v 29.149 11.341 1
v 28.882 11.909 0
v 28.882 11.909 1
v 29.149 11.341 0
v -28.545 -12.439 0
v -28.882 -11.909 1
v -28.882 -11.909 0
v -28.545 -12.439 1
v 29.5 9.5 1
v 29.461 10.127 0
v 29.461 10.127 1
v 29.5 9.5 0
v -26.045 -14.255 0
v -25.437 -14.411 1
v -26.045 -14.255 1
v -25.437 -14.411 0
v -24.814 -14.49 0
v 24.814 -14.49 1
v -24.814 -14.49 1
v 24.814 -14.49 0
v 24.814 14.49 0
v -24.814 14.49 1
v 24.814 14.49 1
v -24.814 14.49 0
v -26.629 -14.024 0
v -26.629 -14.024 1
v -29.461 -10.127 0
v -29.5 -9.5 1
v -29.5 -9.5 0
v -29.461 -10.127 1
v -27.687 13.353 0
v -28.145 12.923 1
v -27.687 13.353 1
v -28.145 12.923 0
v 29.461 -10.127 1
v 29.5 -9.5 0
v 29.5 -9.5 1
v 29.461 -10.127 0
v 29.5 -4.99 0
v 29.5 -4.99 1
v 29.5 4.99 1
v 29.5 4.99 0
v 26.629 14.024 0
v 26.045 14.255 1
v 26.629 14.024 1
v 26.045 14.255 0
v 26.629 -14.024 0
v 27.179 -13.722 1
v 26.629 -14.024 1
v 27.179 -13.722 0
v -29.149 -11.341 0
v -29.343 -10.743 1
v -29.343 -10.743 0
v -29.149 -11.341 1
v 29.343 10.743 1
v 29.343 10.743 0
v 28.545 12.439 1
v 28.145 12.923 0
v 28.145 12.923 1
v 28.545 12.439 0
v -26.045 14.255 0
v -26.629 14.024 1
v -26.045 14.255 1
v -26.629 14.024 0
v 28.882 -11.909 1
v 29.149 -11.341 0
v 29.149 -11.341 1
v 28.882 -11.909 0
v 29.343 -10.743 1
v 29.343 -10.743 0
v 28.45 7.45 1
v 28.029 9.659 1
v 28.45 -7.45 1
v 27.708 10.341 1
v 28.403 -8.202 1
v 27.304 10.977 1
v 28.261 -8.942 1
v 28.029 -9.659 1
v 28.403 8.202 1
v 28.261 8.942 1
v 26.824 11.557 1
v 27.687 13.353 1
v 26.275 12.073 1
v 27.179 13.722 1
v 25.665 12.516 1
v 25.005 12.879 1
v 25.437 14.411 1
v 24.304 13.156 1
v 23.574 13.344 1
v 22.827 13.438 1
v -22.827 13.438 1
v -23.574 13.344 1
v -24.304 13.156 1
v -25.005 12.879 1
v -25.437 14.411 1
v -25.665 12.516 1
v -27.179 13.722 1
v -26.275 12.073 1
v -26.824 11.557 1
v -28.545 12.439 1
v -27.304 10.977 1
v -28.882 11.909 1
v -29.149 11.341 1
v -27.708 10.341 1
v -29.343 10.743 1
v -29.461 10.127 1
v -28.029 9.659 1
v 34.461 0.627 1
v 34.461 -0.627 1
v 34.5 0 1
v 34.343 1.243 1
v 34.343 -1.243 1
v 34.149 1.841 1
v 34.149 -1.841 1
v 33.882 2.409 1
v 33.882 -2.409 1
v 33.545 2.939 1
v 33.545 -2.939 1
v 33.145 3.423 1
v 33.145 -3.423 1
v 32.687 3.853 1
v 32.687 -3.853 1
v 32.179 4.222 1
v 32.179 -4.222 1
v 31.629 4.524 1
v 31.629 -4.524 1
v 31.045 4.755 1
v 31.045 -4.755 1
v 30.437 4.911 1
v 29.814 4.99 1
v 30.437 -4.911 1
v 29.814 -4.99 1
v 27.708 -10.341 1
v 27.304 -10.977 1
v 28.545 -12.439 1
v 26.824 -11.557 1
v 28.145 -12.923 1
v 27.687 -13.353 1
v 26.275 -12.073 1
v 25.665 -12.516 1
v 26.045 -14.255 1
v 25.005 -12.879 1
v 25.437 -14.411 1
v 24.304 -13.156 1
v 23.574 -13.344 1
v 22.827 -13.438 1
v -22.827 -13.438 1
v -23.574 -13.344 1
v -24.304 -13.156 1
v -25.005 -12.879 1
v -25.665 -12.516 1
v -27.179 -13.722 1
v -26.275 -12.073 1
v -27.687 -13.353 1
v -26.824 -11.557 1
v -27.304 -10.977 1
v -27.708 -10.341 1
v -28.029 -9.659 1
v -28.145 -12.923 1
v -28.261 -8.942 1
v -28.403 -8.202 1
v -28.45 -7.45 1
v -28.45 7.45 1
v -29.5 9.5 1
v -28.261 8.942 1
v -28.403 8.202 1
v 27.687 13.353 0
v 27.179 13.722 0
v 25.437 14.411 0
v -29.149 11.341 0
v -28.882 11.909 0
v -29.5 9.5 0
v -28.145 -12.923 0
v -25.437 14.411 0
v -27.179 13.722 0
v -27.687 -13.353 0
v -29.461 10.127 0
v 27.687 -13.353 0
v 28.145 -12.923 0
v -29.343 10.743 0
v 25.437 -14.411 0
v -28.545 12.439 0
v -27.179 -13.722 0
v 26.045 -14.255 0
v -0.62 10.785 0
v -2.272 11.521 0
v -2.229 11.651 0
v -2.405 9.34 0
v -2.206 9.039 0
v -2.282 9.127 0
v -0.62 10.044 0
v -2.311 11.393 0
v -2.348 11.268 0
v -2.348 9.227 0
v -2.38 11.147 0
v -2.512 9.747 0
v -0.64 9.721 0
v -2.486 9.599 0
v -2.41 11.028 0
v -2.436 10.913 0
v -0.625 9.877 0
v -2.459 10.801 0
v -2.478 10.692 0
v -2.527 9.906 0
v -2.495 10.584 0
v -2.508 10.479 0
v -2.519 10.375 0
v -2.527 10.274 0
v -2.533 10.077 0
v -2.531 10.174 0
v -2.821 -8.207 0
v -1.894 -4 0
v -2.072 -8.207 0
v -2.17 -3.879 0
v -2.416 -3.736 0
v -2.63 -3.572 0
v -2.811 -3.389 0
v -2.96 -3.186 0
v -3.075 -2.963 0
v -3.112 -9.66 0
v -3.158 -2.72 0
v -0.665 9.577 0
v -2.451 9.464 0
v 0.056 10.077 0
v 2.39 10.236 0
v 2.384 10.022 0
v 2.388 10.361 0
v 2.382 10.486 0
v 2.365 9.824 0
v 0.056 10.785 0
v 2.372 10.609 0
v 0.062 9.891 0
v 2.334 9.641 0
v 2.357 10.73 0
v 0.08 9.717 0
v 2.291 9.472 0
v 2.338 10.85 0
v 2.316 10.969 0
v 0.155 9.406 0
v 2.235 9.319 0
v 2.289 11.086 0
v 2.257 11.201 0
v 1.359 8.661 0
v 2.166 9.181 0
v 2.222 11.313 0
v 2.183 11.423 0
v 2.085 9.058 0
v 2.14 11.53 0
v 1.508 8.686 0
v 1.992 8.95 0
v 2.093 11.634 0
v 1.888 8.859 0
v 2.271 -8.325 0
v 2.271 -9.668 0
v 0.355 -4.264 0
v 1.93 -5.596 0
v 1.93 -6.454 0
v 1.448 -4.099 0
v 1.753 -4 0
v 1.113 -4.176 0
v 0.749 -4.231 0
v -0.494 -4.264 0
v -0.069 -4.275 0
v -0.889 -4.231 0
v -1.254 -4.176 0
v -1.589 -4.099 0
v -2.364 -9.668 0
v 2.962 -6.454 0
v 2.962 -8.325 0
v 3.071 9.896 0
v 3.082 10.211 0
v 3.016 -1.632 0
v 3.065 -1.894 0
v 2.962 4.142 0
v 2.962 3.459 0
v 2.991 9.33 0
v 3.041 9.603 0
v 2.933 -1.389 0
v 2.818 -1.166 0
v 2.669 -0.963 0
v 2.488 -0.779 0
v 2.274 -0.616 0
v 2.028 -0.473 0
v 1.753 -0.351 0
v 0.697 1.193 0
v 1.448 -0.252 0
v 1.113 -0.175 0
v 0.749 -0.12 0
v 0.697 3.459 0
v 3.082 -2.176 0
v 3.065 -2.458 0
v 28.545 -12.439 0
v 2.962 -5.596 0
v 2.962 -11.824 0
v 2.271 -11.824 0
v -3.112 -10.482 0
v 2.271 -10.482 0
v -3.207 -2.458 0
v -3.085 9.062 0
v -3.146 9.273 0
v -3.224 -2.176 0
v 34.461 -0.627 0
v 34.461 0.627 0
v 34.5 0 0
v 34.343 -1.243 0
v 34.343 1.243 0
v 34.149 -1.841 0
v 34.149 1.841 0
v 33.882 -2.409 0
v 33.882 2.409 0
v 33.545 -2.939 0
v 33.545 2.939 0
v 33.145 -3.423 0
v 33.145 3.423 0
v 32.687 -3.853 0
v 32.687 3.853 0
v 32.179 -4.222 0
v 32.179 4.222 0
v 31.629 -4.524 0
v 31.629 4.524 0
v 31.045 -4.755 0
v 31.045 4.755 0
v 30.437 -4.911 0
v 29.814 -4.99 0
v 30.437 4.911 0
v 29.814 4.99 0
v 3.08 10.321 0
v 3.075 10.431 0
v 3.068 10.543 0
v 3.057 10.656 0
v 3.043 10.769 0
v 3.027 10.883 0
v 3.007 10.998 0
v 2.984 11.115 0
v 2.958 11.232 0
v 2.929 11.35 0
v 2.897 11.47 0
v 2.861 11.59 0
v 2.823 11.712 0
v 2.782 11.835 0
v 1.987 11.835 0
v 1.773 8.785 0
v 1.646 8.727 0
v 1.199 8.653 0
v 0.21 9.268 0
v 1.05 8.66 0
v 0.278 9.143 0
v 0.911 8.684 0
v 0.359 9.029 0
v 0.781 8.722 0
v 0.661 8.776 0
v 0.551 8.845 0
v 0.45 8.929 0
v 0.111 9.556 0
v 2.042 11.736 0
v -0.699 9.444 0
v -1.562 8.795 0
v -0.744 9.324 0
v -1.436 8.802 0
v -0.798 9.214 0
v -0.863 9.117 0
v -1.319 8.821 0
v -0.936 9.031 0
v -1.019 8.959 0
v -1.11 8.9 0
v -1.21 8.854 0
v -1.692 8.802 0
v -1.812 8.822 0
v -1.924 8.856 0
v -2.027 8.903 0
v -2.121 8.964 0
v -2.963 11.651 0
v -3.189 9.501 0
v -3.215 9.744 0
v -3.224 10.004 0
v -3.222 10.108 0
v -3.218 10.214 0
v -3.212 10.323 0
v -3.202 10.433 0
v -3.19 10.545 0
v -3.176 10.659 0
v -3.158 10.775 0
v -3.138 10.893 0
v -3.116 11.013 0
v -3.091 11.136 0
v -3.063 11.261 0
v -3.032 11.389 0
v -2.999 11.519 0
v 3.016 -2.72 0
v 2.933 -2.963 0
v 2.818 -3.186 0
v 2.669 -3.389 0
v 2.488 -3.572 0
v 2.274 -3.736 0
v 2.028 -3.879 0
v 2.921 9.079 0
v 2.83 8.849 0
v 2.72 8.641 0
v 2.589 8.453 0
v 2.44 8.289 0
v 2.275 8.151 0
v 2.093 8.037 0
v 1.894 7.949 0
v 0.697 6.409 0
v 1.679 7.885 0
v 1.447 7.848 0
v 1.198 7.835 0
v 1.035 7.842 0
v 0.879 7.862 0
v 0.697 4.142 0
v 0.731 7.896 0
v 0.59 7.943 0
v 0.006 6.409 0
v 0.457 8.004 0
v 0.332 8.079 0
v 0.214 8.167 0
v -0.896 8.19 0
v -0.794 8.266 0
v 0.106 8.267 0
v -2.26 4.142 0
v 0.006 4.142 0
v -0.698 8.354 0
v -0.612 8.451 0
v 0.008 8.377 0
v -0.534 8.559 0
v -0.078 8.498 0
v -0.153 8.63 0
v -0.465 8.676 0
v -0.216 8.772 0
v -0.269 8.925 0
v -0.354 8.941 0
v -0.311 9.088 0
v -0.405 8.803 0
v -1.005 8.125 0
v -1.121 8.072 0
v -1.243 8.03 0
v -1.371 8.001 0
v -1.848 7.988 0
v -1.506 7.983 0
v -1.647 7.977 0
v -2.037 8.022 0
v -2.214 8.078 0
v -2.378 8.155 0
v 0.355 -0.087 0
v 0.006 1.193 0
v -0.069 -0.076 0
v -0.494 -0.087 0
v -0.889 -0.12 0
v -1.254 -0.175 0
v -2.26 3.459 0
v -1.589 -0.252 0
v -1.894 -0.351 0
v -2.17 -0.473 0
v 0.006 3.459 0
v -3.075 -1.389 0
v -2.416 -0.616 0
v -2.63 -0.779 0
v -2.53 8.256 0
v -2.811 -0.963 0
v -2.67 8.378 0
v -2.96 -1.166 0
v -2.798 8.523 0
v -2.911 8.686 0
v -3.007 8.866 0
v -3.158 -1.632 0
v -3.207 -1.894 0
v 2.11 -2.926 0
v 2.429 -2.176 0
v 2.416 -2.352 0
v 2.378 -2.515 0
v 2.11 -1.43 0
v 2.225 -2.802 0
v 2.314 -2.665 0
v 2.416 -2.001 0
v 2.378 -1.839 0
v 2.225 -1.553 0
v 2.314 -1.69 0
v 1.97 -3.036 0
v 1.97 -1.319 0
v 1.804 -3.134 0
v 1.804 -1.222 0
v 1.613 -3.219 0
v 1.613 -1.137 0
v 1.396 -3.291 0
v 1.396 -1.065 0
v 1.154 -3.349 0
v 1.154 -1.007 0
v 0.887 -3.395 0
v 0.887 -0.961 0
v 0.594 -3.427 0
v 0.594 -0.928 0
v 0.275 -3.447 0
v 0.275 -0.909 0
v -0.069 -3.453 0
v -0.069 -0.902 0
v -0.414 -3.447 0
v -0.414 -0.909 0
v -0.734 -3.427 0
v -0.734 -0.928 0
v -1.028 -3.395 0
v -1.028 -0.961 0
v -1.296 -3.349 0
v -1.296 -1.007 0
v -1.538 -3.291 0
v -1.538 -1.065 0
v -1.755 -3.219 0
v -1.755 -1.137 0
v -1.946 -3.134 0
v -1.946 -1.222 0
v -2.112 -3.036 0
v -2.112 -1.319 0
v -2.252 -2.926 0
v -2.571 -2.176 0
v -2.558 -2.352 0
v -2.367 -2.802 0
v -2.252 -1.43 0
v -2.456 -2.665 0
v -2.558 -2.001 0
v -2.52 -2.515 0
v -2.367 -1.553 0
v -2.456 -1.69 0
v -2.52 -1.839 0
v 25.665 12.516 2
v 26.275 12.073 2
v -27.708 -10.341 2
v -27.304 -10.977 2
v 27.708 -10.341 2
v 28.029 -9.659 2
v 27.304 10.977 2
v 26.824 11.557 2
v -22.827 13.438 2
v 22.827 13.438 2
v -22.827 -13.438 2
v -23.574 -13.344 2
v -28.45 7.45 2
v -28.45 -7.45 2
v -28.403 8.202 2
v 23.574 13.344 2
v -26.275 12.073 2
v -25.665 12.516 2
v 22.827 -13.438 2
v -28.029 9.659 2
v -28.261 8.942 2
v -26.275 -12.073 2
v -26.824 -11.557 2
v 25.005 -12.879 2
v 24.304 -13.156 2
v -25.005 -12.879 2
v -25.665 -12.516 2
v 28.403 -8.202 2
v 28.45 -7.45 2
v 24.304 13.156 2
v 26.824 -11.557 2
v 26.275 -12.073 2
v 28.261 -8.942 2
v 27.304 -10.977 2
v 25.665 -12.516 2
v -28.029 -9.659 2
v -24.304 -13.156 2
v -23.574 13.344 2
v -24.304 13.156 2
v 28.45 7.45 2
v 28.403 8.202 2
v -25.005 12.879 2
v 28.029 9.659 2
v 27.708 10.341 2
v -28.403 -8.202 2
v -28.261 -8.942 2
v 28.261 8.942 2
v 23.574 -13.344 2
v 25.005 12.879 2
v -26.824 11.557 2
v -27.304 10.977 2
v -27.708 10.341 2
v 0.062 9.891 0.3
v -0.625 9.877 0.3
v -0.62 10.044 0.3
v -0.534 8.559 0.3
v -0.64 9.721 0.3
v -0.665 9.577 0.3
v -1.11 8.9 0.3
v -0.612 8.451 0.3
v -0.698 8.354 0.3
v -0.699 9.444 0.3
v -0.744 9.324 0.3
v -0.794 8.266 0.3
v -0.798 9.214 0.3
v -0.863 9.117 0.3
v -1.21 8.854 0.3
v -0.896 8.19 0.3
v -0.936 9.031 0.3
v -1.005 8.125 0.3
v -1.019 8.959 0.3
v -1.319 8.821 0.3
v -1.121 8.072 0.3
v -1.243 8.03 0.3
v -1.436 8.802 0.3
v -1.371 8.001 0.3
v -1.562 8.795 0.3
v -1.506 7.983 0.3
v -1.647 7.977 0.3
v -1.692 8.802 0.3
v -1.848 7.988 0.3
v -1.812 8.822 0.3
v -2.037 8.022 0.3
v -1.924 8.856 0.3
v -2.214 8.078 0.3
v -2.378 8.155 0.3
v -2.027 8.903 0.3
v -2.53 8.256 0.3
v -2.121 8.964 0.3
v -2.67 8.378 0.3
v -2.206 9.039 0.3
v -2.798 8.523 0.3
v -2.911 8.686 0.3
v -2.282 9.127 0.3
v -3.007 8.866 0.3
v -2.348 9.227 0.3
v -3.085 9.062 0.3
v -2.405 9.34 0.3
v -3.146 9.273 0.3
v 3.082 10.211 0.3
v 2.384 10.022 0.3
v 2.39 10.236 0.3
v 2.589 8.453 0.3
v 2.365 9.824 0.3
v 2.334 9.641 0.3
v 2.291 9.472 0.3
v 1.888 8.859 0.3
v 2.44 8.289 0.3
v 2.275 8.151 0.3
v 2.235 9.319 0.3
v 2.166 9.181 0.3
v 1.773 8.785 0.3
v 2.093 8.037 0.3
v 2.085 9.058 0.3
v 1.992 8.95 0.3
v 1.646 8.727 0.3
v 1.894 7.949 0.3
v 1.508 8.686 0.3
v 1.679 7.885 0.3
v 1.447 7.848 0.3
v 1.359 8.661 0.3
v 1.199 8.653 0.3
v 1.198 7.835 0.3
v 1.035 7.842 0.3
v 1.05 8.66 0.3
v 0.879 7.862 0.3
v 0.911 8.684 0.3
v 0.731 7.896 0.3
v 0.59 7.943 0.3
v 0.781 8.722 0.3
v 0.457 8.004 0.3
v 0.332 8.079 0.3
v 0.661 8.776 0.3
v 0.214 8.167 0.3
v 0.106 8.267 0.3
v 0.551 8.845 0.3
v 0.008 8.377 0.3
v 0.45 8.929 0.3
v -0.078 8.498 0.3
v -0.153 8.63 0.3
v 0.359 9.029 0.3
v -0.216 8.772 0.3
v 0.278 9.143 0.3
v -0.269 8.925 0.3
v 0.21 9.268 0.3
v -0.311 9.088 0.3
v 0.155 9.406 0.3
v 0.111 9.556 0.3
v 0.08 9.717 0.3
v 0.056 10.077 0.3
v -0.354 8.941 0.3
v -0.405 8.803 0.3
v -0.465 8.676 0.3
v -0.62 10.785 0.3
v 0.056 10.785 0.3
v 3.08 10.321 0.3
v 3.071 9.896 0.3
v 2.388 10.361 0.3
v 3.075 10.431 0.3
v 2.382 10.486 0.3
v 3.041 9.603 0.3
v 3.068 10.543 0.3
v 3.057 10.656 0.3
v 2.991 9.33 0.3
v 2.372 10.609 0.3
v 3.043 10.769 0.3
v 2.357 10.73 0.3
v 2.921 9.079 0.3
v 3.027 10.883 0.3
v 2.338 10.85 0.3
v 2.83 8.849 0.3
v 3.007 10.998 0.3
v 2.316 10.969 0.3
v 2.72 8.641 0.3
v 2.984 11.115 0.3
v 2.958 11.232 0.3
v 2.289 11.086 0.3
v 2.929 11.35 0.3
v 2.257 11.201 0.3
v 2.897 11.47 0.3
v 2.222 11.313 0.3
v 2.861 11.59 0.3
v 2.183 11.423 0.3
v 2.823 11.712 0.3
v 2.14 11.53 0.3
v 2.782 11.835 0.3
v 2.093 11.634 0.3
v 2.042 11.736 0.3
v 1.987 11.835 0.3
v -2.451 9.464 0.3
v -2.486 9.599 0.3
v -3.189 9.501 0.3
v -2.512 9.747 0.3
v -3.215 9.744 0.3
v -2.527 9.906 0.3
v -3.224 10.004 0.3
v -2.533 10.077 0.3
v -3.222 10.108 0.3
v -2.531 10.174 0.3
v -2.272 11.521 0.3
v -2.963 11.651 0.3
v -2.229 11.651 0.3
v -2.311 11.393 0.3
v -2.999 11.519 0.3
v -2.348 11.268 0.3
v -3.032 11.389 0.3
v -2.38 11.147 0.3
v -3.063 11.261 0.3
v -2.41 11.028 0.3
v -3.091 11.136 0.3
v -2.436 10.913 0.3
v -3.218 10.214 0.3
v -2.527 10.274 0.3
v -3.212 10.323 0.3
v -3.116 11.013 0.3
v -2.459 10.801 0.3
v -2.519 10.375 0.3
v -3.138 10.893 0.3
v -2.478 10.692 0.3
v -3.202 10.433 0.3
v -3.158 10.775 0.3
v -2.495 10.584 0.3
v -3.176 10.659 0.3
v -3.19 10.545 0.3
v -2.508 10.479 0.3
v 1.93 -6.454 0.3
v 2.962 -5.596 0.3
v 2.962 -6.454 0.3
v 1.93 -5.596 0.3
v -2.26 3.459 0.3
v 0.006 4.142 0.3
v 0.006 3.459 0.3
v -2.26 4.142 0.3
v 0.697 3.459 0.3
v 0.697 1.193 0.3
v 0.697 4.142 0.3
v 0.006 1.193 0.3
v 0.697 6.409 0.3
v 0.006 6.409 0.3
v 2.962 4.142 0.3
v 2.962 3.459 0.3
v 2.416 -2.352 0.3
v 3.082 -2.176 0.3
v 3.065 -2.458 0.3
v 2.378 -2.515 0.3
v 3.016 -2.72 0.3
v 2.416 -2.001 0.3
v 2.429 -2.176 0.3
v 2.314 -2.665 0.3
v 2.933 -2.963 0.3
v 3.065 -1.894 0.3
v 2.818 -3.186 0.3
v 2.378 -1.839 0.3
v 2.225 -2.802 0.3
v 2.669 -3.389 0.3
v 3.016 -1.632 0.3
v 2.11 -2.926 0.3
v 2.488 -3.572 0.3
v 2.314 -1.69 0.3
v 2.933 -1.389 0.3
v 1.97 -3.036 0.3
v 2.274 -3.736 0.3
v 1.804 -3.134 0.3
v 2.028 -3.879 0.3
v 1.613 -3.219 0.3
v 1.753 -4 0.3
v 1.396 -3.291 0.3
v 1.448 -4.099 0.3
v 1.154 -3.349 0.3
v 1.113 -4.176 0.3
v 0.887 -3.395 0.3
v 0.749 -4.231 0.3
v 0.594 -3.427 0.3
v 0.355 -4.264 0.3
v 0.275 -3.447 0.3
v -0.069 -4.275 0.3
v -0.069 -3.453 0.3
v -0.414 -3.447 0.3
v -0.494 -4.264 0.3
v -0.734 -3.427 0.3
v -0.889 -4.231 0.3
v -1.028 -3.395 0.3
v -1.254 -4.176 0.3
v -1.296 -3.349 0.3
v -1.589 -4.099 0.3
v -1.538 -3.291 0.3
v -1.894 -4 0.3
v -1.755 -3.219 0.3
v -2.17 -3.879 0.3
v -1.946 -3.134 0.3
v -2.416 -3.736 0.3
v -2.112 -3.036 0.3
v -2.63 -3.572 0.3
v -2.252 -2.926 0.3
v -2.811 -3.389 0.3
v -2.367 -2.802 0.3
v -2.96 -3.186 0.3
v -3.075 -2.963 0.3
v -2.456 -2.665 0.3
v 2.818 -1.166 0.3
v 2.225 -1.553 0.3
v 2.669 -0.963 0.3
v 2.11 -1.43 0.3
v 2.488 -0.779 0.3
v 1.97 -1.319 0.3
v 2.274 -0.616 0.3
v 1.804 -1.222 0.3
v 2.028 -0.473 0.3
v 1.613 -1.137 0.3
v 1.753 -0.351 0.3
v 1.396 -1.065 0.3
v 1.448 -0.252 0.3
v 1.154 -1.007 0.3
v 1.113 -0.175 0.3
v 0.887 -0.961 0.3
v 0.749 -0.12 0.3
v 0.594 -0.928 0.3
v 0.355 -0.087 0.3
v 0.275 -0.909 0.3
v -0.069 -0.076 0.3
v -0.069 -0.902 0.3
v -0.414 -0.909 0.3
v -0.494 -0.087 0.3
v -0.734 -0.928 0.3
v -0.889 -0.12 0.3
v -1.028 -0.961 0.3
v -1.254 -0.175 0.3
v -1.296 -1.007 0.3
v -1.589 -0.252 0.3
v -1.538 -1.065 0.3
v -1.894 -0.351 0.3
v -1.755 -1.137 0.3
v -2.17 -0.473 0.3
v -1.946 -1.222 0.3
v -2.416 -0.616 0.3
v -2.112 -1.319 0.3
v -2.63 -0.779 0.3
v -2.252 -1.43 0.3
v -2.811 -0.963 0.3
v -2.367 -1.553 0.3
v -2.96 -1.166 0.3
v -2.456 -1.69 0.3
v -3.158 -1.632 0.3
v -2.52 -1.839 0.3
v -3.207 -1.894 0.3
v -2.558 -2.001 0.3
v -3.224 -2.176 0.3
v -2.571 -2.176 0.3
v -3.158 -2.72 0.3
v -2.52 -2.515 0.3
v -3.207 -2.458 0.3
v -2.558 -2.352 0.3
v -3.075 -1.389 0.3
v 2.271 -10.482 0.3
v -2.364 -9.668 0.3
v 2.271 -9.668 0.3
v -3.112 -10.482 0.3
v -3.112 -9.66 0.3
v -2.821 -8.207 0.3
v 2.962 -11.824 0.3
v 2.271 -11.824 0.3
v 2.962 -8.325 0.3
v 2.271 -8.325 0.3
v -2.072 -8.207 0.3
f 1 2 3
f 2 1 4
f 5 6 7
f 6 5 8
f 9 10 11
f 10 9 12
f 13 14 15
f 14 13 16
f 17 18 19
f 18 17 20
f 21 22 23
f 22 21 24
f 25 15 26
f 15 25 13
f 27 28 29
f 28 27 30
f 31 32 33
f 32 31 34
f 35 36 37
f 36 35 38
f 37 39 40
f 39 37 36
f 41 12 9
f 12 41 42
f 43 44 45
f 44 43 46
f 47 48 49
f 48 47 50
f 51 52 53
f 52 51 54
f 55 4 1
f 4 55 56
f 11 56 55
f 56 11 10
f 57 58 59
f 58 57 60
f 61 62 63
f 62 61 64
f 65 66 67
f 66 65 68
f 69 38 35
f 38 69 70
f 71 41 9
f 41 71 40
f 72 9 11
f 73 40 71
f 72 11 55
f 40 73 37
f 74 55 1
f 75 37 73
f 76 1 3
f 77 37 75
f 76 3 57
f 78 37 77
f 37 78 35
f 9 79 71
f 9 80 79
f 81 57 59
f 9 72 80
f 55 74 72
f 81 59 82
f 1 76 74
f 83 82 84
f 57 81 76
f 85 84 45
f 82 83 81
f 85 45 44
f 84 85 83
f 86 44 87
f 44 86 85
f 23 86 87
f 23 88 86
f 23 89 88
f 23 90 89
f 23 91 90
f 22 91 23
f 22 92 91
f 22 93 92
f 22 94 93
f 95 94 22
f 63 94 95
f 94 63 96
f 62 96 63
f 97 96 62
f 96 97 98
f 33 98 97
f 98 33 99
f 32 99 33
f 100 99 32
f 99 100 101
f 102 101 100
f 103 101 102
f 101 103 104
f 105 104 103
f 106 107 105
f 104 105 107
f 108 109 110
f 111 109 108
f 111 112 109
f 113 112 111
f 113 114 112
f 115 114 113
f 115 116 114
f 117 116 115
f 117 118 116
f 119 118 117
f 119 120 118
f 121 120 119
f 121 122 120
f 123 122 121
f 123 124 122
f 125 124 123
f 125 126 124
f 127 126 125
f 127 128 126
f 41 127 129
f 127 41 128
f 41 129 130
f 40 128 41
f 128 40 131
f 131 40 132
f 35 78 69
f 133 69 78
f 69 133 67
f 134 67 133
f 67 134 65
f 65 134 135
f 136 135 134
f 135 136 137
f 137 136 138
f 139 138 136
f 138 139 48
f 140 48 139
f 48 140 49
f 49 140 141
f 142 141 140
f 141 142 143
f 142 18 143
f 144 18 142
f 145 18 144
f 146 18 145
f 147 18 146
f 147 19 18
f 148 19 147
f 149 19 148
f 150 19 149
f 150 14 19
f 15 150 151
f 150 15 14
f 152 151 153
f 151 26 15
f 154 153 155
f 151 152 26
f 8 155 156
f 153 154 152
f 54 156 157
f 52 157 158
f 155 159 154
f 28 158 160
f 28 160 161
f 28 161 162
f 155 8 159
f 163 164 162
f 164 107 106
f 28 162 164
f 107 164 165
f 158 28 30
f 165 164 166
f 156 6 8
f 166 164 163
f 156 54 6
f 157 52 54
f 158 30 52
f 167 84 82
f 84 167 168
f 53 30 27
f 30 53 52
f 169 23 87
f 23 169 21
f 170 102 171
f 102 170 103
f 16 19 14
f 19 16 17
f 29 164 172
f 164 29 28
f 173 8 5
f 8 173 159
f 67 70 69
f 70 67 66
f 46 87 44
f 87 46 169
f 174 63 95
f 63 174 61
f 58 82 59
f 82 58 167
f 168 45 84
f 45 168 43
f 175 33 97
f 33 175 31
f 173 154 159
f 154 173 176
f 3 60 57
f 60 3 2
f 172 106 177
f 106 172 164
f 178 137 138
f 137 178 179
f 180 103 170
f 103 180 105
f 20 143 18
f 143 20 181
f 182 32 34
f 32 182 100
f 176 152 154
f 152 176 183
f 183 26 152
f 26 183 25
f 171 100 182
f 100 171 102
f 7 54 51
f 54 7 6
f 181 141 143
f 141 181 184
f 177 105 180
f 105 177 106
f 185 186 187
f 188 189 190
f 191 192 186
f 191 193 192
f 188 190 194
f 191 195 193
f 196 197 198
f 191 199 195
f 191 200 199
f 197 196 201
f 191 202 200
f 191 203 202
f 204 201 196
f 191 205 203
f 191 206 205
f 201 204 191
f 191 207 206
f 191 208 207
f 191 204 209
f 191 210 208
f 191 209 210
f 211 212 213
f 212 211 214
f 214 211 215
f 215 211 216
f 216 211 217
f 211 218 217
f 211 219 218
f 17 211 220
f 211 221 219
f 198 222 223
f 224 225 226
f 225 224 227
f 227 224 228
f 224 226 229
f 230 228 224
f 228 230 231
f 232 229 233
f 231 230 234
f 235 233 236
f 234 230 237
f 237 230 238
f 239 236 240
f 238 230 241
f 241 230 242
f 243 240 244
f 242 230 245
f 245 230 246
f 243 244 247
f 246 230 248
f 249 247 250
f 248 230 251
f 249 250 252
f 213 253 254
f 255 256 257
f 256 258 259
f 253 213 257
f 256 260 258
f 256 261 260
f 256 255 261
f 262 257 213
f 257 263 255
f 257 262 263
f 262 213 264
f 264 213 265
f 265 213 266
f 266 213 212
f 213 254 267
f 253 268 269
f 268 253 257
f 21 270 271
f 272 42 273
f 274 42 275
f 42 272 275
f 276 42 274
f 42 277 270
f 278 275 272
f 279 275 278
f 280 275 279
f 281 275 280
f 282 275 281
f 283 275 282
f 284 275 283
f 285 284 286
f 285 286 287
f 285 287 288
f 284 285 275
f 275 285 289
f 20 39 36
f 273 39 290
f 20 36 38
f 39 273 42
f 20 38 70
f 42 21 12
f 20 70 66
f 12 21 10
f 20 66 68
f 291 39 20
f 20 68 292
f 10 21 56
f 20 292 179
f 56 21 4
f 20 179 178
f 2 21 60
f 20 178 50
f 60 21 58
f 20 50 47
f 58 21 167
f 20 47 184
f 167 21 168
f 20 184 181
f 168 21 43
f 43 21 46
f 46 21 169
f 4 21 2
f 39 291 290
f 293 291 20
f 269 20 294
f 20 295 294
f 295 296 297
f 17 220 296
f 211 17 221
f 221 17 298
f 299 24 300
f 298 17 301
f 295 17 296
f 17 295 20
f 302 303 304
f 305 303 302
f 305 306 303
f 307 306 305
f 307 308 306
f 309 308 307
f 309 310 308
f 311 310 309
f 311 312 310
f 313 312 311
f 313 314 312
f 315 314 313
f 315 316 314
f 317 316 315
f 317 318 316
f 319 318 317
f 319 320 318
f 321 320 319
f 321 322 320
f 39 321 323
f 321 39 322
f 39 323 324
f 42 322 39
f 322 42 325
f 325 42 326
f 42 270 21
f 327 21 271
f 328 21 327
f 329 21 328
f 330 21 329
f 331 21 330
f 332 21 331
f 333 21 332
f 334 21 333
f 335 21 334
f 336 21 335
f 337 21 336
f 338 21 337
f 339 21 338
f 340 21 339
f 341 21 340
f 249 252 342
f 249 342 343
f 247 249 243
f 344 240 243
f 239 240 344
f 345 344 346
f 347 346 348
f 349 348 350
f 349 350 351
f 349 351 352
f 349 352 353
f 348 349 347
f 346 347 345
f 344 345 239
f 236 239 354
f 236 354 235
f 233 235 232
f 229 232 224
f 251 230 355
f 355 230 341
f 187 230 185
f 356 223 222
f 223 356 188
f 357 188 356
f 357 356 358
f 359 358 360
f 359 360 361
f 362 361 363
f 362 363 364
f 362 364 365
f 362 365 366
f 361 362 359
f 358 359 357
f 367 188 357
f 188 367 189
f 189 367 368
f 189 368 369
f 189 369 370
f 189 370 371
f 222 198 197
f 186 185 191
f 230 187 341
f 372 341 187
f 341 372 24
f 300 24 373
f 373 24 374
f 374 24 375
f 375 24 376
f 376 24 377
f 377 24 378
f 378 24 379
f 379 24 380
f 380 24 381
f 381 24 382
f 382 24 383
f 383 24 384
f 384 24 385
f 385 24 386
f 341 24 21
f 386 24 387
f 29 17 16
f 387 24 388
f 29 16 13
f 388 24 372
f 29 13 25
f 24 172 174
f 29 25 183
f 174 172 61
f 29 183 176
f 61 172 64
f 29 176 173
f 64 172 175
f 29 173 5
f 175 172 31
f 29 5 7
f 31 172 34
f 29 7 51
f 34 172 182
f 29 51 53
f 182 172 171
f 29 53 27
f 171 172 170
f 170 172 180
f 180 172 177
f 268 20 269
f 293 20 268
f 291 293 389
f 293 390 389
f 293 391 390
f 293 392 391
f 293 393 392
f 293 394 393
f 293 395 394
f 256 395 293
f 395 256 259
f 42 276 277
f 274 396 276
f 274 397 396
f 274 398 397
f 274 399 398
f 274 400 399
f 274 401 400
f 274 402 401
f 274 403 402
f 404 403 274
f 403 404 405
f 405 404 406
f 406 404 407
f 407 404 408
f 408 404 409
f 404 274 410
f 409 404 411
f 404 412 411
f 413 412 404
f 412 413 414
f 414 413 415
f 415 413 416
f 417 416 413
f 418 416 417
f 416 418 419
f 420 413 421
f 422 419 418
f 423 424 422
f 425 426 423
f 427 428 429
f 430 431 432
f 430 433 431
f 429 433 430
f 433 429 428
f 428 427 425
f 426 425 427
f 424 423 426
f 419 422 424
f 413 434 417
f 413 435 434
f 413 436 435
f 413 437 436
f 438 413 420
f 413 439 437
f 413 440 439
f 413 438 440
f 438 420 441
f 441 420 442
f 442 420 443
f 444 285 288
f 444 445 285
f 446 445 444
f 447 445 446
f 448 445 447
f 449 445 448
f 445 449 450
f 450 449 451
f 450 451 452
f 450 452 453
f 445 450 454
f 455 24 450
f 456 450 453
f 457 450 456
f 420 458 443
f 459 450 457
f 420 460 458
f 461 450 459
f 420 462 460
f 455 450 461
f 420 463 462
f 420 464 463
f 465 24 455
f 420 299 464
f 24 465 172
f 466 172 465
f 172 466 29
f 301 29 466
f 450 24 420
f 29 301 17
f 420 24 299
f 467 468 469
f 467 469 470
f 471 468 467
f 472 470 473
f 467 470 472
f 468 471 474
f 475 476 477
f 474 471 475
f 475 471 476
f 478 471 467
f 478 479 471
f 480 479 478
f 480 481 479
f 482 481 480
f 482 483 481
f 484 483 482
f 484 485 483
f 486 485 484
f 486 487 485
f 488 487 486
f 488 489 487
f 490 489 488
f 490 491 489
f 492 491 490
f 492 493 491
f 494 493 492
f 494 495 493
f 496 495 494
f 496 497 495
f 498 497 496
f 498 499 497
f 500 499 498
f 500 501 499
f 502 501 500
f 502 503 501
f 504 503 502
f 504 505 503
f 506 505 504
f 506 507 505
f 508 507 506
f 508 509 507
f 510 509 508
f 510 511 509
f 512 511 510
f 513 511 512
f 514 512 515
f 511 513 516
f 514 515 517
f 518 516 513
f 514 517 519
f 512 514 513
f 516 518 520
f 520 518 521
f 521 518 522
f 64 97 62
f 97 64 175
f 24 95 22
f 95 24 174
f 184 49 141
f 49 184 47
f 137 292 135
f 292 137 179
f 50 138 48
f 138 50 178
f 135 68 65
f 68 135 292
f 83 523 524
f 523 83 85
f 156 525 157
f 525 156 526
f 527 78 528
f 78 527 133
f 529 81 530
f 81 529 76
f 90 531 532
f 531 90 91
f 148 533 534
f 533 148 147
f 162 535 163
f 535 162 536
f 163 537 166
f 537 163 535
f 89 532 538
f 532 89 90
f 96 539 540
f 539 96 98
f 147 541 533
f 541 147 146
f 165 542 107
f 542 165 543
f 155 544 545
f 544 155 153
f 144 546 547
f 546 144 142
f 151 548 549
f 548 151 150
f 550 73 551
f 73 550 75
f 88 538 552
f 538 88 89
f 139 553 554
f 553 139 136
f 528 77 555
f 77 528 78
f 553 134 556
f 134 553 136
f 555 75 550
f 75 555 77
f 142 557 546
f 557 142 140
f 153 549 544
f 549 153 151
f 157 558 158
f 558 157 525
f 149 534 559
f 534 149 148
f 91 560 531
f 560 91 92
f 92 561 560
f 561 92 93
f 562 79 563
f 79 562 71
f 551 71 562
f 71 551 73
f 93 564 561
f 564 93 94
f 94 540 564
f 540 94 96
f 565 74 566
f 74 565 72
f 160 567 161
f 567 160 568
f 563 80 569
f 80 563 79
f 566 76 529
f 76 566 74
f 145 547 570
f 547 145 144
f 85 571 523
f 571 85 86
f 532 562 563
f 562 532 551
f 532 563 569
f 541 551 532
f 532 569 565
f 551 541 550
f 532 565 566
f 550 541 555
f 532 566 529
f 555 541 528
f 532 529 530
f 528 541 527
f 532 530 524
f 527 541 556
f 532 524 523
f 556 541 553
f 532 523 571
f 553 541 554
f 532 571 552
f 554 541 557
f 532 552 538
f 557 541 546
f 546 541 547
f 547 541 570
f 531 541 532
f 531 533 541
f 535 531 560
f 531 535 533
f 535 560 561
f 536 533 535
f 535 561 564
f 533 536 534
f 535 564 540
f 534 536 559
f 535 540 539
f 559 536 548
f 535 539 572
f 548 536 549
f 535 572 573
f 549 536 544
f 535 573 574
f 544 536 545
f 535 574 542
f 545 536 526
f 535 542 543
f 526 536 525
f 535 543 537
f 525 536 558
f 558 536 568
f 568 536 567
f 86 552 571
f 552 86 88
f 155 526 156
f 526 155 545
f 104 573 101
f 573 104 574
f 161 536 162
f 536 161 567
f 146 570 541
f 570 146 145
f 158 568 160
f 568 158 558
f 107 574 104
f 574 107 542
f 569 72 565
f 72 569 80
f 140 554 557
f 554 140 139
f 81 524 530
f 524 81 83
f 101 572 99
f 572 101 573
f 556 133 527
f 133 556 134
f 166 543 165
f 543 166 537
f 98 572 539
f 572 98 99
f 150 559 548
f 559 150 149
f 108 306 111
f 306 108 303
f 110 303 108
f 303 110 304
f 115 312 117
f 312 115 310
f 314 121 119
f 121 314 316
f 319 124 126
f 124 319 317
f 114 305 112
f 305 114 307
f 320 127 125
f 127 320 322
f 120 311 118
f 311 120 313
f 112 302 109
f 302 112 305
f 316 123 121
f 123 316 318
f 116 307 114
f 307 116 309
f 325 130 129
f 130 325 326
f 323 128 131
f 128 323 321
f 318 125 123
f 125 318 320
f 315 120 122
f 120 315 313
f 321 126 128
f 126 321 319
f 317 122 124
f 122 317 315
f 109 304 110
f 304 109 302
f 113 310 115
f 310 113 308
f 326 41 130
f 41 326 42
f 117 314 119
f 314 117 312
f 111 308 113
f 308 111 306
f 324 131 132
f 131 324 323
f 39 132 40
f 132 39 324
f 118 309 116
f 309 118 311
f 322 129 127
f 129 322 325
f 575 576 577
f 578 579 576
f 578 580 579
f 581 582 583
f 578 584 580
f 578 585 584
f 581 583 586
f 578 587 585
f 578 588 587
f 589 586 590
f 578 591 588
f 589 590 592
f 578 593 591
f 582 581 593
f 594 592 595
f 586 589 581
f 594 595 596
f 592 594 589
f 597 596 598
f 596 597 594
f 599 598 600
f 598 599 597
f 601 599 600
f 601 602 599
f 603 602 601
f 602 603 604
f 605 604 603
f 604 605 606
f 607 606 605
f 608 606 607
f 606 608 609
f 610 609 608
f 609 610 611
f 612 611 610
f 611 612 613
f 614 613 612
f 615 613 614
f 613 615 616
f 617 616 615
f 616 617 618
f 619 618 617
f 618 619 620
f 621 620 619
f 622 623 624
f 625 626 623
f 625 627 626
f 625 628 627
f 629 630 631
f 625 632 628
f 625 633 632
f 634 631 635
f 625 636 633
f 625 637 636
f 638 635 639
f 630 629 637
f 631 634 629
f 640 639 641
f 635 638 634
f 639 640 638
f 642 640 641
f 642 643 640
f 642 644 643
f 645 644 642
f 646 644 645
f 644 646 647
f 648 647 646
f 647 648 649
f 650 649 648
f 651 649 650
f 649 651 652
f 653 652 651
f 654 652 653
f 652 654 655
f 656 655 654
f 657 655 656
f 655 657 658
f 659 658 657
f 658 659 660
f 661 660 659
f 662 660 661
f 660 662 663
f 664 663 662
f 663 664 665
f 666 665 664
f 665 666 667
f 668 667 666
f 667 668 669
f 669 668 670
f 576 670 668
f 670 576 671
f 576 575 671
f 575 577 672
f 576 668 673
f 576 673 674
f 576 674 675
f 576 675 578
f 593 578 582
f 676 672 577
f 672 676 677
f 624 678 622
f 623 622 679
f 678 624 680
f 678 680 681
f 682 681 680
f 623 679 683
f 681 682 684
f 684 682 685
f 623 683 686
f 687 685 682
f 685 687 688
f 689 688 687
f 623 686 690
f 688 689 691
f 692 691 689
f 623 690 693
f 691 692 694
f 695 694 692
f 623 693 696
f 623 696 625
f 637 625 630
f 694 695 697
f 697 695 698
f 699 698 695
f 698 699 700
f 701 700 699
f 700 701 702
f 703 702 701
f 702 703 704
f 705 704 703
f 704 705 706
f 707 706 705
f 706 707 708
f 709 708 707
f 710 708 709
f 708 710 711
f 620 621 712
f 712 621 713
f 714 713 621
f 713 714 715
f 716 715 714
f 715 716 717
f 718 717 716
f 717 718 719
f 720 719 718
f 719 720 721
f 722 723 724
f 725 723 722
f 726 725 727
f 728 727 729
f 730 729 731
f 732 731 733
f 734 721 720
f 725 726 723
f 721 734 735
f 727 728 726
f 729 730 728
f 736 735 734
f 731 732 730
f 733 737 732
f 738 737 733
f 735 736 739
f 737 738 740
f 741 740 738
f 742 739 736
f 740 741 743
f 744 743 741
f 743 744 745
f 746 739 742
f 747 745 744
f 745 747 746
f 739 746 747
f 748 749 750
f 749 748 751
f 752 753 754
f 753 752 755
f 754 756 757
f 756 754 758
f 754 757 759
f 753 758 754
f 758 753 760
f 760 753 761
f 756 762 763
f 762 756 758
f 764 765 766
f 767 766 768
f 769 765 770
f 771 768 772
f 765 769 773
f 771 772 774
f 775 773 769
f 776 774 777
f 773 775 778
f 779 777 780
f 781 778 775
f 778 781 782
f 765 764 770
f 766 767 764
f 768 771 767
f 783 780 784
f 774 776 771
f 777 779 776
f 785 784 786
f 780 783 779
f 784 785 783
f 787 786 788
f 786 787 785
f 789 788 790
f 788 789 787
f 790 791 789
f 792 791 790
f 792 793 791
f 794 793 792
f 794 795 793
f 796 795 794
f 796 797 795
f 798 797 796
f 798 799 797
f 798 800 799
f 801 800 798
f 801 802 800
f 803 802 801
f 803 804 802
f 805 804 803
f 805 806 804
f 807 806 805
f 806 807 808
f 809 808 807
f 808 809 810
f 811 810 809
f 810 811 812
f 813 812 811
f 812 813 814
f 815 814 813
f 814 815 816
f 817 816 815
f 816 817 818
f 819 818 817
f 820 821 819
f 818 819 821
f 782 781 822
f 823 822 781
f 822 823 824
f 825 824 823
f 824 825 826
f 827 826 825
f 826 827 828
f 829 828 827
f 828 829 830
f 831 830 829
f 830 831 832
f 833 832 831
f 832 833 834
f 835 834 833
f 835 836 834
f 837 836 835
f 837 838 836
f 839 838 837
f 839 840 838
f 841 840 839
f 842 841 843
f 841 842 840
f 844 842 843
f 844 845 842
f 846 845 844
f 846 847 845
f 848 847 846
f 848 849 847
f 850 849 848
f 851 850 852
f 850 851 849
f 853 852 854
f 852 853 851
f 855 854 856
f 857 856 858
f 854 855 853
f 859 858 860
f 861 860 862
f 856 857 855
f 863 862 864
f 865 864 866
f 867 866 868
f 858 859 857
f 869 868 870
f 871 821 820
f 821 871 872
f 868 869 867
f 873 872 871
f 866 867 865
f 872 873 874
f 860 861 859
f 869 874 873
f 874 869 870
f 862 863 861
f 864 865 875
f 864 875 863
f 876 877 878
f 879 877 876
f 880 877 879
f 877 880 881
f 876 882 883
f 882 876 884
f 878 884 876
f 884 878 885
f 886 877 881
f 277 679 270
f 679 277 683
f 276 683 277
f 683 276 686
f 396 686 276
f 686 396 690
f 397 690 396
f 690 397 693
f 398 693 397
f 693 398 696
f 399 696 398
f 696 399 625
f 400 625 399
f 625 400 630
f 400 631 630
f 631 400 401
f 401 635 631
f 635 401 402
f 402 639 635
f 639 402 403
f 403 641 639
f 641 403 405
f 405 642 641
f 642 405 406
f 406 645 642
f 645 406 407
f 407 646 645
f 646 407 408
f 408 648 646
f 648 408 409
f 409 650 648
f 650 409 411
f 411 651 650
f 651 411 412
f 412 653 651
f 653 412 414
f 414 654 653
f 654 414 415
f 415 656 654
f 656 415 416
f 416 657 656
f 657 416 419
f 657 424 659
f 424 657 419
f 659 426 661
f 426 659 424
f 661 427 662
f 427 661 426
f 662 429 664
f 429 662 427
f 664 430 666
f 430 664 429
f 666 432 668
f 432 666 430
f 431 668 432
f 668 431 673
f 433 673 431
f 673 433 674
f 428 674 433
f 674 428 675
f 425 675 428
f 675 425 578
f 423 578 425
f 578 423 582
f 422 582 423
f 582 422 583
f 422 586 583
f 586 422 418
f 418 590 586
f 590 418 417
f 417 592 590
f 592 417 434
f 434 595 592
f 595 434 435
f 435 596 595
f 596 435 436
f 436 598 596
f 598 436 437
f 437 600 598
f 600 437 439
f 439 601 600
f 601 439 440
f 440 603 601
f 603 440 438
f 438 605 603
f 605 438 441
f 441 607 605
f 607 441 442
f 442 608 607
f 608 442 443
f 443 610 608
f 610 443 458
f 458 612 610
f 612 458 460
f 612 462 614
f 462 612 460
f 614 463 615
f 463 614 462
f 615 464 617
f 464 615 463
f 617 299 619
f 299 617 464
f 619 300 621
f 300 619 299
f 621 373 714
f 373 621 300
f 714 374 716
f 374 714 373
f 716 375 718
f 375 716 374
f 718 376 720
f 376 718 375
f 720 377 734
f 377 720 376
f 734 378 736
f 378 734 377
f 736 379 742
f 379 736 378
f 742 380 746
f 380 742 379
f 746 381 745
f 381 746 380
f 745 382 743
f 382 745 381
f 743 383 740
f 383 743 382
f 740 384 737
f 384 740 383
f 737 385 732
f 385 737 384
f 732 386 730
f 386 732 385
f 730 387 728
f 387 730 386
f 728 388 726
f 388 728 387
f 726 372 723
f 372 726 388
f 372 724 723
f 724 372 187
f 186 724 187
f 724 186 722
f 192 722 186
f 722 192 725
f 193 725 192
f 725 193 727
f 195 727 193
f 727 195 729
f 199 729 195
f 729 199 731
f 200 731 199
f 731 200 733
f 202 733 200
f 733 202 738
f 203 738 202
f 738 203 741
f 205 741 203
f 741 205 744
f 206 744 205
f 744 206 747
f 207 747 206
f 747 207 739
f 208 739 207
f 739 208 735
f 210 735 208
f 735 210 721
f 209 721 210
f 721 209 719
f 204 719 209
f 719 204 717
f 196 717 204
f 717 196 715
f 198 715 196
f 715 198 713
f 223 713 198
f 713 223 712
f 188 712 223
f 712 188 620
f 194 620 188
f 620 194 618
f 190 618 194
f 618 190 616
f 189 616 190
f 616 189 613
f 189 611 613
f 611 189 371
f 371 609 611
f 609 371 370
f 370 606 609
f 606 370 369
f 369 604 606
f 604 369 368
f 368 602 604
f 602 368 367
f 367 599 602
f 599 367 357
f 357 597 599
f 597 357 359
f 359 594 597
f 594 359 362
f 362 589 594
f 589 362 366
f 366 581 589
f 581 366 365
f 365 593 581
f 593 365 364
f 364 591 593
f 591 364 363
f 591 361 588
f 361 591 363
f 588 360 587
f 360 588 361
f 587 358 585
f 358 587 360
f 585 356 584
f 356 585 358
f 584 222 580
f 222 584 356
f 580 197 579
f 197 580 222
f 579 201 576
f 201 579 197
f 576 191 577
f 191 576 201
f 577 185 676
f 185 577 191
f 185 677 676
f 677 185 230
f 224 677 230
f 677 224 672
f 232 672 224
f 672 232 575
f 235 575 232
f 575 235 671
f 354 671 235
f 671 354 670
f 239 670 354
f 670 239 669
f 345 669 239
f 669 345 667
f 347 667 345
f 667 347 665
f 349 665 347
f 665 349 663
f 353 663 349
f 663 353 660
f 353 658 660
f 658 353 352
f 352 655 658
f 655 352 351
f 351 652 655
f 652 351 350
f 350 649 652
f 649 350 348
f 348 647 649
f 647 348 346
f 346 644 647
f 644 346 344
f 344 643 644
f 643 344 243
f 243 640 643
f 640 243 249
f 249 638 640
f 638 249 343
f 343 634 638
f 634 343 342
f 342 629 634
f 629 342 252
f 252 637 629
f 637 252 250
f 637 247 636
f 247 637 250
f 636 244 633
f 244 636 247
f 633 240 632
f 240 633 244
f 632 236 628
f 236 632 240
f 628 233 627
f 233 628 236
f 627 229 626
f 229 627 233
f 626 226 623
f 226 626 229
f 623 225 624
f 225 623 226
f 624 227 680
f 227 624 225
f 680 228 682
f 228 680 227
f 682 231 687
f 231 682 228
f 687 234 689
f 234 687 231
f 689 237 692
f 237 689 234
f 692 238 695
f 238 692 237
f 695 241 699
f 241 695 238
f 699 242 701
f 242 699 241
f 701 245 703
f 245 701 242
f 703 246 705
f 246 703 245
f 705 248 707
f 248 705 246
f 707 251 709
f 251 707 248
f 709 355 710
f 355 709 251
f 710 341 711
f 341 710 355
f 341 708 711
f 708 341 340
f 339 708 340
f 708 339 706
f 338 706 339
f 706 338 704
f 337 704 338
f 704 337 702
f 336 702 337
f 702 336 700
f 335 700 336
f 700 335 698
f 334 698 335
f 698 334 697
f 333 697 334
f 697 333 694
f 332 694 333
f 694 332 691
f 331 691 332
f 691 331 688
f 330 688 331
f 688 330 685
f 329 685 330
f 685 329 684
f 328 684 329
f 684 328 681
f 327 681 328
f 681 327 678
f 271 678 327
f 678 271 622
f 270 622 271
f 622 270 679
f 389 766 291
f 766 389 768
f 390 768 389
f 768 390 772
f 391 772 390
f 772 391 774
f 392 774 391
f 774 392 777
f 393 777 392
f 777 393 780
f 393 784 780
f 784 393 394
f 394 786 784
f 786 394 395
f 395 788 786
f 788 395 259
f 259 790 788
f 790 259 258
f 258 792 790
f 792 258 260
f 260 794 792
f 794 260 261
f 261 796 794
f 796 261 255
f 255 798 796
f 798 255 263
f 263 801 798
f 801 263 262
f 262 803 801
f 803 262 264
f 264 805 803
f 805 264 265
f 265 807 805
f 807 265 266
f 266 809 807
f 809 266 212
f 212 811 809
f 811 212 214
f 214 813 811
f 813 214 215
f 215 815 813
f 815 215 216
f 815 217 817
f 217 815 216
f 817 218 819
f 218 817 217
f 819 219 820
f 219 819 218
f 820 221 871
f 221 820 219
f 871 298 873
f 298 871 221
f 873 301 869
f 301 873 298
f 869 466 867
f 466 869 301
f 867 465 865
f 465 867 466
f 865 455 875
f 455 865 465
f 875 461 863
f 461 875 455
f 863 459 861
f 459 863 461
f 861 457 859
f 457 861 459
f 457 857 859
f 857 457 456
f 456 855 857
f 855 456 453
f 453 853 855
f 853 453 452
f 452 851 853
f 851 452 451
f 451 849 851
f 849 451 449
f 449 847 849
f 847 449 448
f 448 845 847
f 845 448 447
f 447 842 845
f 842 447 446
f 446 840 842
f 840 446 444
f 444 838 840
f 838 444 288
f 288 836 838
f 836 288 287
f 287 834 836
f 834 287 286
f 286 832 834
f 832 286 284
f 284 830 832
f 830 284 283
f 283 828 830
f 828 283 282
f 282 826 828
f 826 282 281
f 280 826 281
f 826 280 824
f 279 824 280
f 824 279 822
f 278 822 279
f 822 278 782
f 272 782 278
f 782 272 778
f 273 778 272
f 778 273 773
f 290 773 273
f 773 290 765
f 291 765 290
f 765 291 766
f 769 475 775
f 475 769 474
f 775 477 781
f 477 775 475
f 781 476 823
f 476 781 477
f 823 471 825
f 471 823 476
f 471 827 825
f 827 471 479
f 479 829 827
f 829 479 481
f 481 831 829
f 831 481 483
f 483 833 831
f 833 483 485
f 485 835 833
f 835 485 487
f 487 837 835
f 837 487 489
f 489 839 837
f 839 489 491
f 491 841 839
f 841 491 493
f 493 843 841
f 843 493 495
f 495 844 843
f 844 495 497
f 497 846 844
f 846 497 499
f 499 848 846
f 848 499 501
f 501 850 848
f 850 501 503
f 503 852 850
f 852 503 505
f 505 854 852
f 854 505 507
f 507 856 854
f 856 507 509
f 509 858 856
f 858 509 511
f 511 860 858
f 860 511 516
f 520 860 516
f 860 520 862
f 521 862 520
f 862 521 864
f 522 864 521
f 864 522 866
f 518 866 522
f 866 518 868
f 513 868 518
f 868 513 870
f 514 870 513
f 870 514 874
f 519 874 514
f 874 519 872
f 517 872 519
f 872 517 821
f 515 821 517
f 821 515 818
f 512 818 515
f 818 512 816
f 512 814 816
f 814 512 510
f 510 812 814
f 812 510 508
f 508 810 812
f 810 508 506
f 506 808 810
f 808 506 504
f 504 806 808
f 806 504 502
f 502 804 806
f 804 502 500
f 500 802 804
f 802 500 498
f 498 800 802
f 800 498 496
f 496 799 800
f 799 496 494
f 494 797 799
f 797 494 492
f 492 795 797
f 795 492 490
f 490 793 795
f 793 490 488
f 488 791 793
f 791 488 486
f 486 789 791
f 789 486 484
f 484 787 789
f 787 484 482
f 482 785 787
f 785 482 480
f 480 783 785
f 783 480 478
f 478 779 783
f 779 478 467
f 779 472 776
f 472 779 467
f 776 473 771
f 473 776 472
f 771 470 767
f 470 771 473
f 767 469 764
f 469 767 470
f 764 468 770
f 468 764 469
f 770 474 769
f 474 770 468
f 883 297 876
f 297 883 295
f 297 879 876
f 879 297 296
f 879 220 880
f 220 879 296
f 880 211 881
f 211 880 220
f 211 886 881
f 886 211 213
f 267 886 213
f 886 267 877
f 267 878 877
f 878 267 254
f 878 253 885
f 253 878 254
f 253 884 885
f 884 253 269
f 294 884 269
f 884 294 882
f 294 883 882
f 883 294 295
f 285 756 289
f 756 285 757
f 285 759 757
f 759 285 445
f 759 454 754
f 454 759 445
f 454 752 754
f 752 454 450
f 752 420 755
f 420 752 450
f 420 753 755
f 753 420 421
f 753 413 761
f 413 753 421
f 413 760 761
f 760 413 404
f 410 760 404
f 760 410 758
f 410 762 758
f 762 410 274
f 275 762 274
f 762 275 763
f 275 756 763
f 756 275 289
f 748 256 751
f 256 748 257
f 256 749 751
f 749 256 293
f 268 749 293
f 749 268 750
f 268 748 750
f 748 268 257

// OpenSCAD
$fn = 50;


difference() {
	union() {
		translate(v = [0, 0, 0]) {
			rotate(a = [0, 0, 0]) {
				hull() {
					translate(v = [-24.5000000000, 9.5000000000, 0]) {
						rotate(a = [0, 0, 0]) {
							translate(v = [0, 0, 0]) {
								rotate(a = [0, 0, 0]) {
									cylinder(h = 1, r = 5);
								}
							}
						}
					}
					translate(v = [24.5000000000, 9.5000000000, 0]) {
						rotate(a = [0, 0, 0]) {
							translate(v = [0, 0, 0]) {
								rotate(a = [0, 0, 0]) {
									cylinder(h = 1, r = 5);
								}
							}
						}
					}
					translate(v = [-24.5000000000, -9.5000000000, 0]) {
						rotate(a = [0, 0, 0]) {
							translate(v = [0, 0, 0]) {
								rotate(a = [0, 0, 0]) {
									cylinder(h = 1, r = 5);
								}
							}
						}
					}
					translate(v = [24.5000000000, -9.5000000000, 0]) {
						rotate(a = [0, 0, 0]) {
							translate(v = [0, 0, 0]) {
								rotate(a = [0, 0, 0]) {
									cylinder(h = 1, r = 5);
								}
							}
						}
					}
				}
			}
		}
		translate(v = [0, 0, 0]) {
			rotate(a = [0, 0, 0]) {
				hull() {
					translate(v = [-22.4500000000, 7.4500000000, 0]) {
						rotate(a = [0, 0, 0]) {
							translate(v = [0, 0, 0]) {
								rotate(a = [0, 0, 0]) {
									cylinder(h = 2, r = 6);
								}
							}
						}
					}
					translate(v = [22.4500000000, 7.4500000000, 0]) {
						rotate(a = [0, 0, 0]) {
							translate(v = [0, 0, 0]) {
								rotate(a = [0, 0, 0]) {
									cylinder(h = 2, r = 6);
								}
							}
						}
					}
					translate(v = [-22.4500000000, -7.4500000000, 0]) {
						rotate(a = [0, 0, 0]) {
							translate(v = [0, 0, 0]) {
								rotate(a = [0, 0, 0]) {
									cylinder(h = 2, r = 6);
								}
							}
						}
					}
					translate(v = [22.4500000000, -7.4500000000, 0]) {
						rotate(a = [0, 0, 0]) {
							translate(v = [0, 0, 0]) {
								rotate(a = [0, 0, 0]) {
									cylinder(h = 2, r = 6);
								}
							}
						}
					}
				}
			}
		}
		translate(v = [29.5000000000, 0, 0.0000000000]) {
			rotate(a = [0, 0, 0]) {
				cylinder(h = 1, r = 5);
			}
		}
	}
	union() {
		translate(v = [0, 0, 0.3000000000]) {
			rotate(a = [0, 180, 90]) {
				linear_extrude(height = 0.3000000000) {
					text(font = "Candara:Light", halign = "center", size = 6, text = "3+0.1", valign = "center");
				}
			}
		}
	}
}
